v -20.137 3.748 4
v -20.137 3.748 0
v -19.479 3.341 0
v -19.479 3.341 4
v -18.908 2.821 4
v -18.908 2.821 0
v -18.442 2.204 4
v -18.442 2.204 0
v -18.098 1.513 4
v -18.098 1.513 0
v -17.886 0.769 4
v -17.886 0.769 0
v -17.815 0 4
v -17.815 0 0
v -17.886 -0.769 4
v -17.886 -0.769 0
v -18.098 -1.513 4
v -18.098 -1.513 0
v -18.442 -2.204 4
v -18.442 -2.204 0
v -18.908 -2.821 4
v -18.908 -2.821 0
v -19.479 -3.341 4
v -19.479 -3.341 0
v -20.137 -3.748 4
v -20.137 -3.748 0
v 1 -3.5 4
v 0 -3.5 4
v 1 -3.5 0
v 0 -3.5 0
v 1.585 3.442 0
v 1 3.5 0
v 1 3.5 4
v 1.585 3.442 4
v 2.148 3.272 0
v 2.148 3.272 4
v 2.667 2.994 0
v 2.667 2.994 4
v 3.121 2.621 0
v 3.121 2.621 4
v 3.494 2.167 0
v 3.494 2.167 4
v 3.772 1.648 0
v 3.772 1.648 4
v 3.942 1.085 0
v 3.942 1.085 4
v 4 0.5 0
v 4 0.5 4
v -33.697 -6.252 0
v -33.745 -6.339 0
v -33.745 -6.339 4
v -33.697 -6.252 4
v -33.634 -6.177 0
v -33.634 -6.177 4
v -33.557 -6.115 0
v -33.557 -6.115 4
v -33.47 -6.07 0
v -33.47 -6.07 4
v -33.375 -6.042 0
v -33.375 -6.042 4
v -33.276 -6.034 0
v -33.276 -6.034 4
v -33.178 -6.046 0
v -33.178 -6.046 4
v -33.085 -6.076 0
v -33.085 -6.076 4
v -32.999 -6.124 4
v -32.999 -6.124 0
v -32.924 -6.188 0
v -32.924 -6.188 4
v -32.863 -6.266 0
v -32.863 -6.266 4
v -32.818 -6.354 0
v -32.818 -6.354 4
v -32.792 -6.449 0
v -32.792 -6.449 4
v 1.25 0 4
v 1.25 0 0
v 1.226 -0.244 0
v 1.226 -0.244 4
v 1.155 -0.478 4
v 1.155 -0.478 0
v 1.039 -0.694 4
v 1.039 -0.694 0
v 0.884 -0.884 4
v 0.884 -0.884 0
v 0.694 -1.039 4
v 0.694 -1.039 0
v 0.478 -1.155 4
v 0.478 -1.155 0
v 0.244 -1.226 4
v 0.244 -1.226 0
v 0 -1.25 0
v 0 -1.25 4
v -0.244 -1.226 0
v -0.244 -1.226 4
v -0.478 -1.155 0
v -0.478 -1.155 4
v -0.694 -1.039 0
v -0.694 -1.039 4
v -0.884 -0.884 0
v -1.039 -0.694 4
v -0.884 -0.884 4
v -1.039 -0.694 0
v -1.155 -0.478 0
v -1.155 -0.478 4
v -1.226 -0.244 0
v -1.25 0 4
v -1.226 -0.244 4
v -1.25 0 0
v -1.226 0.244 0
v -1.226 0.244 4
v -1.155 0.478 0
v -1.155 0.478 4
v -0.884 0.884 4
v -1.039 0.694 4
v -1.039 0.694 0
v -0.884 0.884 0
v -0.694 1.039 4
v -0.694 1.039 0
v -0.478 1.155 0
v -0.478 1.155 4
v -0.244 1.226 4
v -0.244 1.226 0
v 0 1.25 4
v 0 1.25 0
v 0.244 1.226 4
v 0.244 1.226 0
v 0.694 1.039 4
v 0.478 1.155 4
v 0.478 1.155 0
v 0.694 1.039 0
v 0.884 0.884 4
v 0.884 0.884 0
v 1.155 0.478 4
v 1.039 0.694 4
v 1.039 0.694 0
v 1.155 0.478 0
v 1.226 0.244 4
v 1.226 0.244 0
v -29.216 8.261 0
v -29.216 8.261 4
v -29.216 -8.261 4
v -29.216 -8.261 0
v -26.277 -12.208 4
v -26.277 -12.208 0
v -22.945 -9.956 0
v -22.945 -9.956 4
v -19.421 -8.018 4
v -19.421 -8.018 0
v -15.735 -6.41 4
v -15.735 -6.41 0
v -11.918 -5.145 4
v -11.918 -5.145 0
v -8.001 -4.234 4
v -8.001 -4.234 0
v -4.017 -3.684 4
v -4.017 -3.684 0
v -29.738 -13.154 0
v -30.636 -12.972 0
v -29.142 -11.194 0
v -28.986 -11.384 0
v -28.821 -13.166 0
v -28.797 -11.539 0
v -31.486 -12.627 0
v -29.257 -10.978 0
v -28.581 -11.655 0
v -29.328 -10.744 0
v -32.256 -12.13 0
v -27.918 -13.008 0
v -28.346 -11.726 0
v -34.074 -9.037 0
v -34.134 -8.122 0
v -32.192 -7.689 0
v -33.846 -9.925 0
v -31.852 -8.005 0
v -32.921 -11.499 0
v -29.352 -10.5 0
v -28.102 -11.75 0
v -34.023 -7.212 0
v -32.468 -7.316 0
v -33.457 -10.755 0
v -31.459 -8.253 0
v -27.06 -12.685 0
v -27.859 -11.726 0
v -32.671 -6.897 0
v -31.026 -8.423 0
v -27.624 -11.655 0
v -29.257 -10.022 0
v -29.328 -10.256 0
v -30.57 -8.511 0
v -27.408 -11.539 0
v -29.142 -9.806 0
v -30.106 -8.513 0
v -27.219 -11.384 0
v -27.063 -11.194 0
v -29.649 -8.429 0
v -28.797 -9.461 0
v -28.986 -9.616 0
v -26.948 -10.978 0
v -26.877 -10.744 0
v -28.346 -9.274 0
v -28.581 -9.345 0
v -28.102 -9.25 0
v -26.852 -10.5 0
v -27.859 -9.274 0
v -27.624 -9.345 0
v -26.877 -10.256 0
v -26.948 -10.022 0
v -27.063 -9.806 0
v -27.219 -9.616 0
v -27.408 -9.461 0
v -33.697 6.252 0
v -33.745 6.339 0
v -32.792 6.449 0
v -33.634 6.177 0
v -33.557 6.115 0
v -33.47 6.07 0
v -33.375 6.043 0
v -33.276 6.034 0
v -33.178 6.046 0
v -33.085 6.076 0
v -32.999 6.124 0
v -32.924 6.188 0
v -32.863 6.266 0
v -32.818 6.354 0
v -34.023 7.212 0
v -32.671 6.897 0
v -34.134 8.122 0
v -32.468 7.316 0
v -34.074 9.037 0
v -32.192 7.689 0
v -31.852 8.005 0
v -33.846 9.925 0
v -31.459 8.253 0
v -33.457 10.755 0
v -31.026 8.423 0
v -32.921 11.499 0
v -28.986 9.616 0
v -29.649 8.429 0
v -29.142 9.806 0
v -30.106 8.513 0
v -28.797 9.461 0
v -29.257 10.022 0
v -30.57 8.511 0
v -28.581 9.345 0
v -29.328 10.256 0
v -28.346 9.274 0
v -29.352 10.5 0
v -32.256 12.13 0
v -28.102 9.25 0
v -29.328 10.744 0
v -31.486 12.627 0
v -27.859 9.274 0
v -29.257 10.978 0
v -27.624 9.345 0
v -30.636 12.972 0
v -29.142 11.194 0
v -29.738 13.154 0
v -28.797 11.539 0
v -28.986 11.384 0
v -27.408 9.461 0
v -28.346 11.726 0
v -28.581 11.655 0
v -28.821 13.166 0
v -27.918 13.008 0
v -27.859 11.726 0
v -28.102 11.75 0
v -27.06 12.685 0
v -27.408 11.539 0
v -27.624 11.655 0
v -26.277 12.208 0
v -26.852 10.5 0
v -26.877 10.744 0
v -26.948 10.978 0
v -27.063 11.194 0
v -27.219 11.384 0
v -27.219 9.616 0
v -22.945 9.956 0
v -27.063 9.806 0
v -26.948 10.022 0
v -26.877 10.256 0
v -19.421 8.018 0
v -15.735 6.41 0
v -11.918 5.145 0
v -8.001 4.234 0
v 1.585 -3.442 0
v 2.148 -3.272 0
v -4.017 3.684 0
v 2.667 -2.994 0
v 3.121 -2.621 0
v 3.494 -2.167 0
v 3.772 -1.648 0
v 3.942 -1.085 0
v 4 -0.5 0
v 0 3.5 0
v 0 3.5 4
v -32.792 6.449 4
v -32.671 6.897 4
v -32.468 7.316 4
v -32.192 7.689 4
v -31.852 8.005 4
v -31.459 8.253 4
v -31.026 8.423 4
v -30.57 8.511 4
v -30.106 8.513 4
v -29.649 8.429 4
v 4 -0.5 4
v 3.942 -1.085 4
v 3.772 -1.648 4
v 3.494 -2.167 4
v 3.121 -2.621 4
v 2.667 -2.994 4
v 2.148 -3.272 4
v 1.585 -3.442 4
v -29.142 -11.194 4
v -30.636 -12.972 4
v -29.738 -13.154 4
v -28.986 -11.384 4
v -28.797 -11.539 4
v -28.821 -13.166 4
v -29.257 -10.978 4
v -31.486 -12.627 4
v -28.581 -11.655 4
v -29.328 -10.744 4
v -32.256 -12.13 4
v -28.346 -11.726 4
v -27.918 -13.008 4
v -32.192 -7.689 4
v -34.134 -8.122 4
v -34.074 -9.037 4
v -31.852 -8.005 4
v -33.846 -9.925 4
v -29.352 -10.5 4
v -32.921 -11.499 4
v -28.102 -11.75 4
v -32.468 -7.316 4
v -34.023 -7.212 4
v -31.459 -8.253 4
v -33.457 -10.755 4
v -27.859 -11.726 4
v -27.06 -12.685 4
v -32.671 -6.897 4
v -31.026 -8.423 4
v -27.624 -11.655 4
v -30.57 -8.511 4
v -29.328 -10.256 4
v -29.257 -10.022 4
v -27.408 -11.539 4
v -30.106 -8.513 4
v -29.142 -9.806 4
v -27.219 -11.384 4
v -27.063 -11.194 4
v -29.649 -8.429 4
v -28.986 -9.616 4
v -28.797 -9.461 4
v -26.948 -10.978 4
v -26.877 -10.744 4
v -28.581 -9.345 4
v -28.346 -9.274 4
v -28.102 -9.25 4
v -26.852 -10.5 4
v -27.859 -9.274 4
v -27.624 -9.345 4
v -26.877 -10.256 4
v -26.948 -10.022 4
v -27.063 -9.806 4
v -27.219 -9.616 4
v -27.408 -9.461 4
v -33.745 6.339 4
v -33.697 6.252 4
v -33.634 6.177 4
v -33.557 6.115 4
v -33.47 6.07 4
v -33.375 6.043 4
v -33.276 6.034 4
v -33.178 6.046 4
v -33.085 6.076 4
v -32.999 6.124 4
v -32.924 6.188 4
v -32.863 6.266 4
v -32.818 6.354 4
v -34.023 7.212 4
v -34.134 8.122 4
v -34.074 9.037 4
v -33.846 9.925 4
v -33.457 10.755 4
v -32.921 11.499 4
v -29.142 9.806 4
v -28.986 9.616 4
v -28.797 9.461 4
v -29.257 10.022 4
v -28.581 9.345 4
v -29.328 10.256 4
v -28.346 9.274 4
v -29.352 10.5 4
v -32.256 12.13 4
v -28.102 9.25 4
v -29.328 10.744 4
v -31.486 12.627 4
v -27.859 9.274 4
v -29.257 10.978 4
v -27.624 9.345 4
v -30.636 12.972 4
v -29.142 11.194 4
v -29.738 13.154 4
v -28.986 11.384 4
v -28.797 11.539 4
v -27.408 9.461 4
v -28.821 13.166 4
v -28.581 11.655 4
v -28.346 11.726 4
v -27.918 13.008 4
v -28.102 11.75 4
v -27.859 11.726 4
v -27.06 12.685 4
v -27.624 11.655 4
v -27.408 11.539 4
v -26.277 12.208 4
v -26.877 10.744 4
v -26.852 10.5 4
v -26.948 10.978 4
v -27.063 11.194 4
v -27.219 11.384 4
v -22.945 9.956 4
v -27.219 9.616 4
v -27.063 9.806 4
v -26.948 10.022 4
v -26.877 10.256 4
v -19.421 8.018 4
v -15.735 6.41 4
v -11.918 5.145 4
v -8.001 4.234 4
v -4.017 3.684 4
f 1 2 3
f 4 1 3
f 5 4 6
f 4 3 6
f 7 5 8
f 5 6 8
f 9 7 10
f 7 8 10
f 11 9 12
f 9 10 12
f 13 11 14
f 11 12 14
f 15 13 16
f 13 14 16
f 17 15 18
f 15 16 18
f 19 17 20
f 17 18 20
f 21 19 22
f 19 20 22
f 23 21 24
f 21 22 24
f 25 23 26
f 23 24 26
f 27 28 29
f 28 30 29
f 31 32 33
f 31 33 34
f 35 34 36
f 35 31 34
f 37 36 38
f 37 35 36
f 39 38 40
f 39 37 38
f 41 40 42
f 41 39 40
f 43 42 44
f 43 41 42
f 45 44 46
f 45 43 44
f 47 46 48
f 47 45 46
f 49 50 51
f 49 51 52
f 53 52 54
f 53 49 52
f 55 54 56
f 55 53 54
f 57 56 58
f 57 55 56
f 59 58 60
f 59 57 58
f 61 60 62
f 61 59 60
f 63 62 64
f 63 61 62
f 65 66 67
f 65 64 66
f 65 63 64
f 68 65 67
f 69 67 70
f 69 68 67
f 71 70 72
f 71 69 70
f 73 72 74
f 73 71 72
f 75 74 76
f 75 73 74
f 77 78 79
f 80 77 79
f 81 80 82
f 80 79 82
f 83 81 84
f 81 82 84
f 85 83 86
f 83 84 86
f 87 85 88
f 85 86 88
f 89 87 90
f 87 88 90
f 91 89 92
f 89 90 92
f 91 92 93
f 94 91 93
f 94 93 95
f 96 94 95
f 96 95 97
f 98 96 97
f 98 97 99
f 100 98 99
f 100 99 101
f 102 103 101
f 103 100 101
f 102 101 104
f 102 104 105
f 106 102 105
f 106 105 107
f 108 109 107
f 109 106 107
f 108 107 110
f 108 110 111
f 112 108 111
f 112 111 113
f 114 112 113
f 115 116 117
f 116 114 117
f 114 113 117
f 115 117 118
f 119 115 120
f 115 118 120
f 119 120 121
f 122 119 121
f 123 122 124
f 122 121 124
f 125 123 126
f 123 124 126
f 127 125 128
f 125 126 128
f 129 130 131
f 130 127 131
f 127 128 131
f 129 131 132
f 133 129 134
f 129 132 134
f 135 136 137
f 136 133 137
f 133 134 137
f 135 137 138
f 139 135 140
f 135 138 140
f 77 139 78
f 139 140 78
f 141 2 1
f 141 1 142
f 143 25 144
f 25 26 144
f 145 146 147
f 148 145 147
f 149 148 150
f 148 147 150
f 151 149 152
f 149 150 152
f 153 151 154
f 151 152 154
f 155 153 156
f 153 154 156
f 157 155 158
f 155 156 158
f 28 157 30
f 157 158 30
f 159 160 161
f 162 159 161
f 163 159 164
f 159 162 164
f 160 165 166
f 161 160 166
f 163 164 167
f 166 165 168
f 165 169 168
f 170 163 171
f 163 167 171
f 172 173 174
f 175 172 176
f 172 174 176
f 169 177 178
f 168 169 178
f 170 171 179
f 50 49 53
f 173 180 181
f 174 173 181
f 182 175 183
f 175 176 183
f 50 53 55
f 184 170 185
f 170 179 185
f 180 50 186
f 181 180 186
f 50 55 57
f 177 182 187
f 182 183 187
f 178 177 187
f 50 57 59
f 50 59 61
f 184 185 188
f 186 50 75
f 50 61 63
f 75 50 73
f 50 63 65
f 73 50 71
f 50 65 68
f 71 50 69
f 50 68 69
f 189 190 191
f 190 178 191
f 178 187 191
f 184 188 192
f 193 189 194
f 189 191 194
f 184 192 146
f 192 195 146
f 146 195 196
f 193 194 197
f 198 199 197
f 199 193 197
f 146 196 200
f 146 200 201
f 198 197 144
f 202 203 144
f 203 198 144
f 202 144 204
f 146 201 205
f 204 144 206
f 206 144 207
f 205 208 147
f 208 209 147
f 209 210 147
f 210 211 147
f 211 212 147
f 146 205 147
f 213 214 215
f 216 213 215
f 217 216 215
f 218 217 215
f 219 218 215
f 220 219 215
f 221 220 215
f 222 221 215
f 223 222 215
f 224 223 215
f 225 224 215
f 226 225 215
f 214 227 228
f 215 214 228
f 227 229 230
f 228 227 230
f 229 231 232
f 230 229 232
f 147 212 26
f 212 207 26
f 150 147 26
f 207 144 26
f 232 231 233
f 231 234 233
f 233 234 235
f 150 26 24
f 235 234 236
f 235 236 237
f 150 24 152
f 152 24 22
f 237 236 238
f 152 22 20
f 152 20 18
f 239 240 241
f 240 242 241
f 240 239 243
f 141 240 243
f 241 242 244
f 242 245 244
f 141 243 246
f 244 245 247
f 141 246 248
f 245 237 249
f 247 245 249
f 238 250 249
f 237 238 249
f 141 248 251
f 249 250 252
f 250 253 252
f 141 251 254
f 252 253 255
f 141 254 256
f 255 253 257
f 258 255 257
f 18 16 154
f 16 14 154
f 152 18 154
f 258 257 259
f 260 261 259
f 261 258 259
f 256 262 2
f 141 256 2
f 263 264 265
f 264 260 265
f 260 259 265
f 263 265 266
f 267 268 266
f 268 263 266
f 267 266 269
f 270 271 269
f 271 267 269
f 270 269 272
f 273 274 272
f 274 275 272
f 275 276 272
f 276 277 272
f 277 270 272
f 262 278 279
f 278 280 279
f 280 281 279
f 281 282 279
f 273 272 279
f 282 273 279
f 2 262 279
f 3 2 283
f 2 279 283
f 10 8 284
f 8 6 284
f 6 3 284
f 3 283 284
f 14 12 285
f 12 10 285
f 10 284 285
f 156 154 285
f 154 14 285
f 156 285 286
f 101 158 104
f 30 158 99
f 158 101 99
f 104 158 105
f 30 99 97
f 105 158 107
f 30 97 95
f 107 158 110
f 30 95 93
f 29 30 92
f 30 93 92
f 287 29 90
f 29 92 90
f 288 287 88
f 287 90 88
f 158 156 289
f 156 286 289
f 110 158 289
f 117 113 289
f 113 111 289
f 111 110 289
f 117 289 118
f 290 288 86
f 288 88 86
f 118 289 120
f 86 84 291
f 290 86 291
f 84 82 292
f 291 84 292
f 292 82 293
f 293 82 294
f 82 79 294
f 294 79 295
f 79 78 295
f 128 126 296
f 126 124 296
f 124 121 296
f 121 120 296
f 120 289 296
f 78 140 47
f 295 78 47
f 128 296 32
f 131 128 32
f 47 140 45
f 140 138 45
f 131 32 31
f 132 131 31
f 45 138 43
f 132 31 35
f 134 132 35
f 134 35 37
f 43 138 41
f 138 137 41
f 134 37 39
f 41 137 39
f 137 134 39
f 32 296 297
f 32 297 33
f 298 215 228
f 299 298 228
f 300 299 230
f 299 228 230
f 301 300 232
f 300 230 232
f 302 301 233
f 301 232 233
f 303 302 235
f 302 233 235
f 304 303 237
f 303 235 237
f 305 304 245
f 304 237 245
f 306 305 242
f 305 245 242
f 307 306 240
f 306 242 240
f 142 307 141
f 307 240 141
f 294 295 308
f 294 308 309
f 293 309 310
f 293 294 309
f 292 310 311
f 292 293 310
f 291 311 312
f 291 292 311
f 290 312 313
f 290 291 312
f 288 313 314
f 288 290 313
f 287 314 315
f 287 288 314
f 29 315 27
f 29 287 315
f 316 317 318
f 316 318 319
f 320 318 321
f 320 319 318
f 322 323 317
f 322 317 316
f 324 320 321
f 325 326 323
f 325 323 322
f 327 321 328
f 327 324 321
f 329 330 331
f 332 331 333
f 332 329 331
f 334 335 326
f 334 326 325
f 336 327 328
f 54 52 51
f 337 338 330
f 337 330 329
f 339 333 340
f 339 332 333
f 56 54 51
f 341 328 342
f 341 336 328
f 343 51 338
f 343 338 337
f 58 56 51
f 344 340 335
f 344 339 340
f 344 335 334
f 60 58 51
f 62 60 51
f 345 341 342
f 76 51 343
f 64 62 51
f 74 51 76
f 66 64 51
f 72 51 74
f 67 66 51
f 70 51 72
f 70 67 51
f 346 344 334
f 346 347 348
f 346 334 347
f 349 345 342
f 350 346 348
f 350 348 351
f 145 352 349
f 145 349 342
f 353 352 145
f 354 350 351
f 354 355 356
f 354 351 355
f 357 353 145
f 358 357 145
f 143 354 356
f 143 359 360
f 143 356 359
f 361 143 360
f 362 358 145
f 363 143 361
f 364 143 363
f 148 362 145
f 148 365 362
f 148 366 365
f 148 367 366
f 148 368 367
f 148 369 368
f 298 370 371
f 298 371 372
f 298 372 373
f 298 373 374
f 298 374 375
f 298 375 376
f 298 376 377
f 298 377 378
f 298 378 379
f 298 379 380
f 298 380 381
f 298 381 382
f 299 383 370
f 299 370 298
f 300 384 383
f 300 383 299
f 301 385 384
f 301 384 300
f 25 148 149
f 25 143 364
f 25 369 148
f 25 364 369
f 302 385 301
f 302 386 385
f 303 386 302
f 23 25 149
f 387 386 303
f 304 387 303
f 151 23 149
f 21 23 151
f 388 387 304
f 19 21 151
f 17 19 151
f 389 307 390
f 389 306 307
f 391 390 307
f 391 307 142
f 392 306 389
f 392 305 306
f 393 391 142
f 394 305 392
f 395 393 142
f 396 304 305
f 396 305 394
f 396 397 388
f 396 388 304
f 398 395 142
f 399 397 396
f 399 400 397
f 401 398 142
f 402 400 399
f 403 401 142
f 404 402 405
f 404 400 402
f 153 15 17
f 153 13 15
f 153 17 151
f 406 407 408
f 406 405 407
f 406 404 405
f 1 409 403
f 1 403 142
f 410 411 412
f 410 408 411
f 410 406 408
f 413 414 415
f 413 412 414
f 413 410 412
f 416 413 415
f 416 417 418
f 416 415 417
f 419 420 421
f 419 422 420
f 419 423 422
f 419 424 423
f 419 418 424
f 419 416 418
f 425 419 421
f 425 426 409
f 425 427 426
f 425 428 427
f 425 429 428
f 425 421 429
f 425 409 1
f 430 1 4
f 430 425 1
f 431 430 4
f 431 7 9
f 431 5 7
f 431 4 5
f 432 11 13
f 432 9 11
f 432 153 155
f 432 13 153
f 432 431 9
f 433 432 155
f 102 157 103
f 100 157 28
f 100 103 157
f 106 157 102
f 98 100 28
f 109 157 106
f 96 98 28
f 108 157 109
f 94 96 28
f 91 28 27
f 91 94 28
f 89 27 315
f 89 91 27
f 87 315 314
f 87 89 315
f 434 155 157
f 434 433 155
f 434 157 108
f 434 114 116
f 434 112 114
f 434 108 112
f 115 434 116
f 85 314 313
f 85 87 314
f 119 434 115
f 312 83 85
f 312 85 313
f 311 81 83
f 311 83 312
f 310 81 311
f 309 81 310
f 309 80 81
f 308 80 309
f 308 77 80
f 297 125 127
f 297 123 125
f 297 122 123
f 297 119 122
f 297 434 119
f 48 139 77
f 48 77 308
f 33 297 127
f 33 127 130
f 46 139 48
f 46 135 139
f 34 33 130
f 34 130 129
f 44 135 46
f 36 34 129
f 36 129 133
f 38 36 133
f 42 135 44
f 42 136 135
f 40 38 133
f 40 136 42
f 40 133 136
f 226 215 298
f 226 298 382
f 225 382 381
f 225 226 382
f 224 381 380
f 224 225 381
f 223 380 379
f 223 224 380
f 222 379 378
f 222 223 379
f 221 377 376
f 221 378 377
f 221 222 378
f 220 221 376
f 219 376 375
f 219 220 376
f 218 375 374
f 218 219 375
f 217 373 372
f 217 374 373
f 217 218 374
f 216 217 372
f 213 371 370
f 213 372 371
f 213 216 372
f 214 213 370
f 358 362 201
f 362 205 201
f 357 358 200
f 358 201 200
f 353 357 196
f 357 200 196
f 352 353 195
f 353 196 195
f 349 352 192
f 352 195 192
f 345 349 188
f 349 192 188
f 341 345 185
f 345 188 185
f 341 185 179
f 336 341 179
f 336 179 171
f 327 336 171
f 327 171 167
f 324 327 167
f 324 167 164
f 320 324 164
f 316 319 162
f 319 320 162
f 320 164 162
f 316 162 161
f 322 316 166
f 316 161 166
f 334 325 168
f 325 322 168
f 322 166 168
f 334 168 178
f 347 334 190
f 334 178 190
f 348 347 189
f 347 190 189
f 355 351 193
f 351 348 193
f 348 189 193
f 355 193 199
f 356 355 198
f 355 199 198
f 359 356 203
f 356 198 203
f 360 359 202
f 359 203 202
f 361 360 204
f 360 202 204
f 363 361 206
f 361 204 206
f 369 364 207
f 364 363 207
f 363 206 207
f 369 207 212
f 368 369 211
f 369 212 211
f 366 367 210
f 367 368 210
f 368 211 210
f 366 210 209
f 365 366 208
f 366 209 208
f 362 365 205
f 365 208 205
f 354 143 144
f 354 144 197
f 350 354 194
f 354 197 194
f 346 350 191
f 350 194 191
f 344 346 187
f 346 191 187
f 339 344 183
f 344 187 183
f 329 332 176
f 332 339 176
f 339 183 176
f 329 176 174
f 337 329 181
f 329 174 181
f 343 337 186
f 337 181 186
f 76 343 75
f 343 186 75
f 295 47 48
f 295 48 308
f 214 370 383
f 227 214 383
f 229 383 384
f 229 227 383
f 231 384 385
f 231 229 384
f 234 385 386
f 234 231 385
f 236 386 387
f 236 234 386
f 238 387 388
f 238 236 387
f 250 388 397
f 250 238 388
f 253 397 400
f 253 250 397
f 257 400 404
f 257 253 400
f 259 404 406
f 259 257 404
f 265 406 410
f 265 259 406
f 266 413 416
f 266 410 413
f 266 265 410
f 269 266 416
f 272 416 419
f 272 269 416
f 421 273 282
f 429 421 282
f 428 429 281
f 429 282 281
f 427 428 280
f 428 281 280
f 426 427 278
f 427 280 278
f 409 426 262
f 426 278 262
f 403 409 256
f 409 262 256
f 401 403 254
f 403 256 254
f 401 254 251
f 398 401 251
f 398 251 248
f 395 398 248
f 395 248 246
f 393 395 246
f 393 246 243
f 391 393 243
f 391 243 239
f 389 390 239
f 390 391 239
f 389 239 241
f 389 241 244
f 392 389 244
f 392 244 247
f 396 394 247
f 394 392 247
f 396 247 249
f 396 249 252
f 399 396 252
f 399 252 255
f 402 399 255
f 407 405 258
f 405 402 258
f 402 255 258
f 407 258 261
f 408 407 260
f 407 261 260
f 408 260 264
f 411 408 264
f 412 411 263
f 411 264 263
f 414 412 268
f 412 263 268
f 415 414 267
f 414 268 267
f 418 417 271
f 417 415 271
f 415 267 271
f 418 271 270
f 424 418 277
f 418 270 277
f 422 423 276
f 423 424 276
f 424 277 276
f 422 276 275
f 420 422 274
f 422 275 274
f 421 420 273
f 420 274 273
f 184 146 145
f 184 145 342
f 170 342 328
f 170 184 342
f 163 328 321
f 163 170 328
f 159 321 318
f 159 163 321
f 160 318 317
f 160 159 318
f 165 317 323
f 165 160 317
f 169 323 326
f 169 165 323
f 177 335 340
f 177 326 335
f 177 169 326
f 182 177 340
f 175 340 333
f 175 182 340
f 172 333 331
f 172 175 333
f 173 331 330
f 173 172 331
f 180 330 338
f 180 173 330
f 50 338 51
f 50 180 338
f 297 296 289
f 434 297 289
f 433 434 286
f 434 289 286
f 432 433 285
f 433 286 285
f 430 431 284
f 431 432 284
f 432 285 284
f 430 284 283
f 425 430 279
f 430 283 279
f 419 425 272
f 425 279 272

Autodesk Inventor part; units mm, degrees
ref_plane "YZ Plane" through (0, 0, 0) normal (1, 0, 0) x (0, 1, 0)
ref_plane "XZ Plane" through (0, 0, 0) normal (0, 1, 0) x (-1, 0, 0)
ref_plane "XY Plane" through (0, 0, 0) normal (0, 0, 1) x (1, 0, 0)
sketch "Sketch1" plane through (0, 0, 0) normal (0, 0, 1) x (1, 0, 0)
  circle A0 centre (0, 0) radius 1.25
  circle A1 centre (-28.1025, 10.5) radius 1.25
  circle A2 centre (-28.1025, -10.5) radius 1.25
  line L0 (0, 0) -> (-28.1025, 0) construction
  line L1 (-28.1025, 10.5) -> (0, 0) construction
  line L2 (-28.1025, 0) -> (-28.1025, 10.5) construction
  circle A3 centre (0, 0) radius 2.5 construction
  circle A4 centre (-28.1025, 10.5) radius 2.5 construction
  circle A5 centre (-28.1025, -10.5) radius 2.5 construction
  line L3 (0, 0) -> (0, 7) construction
  line L4 (0, 3.5) -> (1, 3.5)
  arc A6 (-26.277, 12.2081) -> (0, 3.5) centre (0, 47.5) ccw
  line L5 (0, -3.5) -> (1, -3.5)
  arc A7 (-20.1367, -3.7476) -> (-20.1367, 3.7476) centre (-22, 0) ccw
  arc A8 (-26.277, 12.2081) -> (-33.7448, 6.3389) centre (-29.2155, 8.2614) ccw
  line L6 (-20.1367, 3.7476) -> (-29.2155, 8.2614)
  arc A9 (-29.2155, 8.2614) -> (-32.7919, 6.449) centre (-30.3285, 6.0228) ccw
  arc A10 (-33.7448, 6.3389) -> (-32.7919, 6.449) centre (-33.2846, 6.5343) ccw
  arc A11 (0, -3.5) -> (-26.277, -12.2081) centre (0, -47.5) ccw
  arc A12 (-33.7448, -6.3389) -> (-26.277, -12.2081) centre (-29.2155, -8.2614) ccw
  line L7 (-20.1367, -3.7476) -> (-29.2155, -8.2614)
  arc A13 (-32.7919, -6.449) -> (-29.2155, -8.2614) centre (-30.3285, -6.0228) ccw
  arc A14 (-32.7919, -6.449) -> (-33.7448, -6.3389) centre (-33.2846, -6.5343) ccw
  line L8 (4, 0.5) -> (4, -0.5)
  arc A15 (4, 0.5) -> (1, 3.5) centre (1, 0.5) ccw
  arc A16 (1, -3.5) -> (4, -0.5) centre (1, -0.5) ccw
  dimension "d0" = 2.5
  dimension "d1" = 10.5
  dimension "d2" = 30
  dimension "d3" = 5
  dimension "d22" = 3.5
  dimension "d32" = 0.5
  dimension "d36" = 22
  dimension "d37" = 2.5
  dimension "d38" = 0.5
  dimension "d47" = 44
  dimension "d48" = 4
  dimension "d49" = 3
extrude "Extrusion1" add sketch "Sketch1" along normal blind 4
properties part number "legFrame_short"
